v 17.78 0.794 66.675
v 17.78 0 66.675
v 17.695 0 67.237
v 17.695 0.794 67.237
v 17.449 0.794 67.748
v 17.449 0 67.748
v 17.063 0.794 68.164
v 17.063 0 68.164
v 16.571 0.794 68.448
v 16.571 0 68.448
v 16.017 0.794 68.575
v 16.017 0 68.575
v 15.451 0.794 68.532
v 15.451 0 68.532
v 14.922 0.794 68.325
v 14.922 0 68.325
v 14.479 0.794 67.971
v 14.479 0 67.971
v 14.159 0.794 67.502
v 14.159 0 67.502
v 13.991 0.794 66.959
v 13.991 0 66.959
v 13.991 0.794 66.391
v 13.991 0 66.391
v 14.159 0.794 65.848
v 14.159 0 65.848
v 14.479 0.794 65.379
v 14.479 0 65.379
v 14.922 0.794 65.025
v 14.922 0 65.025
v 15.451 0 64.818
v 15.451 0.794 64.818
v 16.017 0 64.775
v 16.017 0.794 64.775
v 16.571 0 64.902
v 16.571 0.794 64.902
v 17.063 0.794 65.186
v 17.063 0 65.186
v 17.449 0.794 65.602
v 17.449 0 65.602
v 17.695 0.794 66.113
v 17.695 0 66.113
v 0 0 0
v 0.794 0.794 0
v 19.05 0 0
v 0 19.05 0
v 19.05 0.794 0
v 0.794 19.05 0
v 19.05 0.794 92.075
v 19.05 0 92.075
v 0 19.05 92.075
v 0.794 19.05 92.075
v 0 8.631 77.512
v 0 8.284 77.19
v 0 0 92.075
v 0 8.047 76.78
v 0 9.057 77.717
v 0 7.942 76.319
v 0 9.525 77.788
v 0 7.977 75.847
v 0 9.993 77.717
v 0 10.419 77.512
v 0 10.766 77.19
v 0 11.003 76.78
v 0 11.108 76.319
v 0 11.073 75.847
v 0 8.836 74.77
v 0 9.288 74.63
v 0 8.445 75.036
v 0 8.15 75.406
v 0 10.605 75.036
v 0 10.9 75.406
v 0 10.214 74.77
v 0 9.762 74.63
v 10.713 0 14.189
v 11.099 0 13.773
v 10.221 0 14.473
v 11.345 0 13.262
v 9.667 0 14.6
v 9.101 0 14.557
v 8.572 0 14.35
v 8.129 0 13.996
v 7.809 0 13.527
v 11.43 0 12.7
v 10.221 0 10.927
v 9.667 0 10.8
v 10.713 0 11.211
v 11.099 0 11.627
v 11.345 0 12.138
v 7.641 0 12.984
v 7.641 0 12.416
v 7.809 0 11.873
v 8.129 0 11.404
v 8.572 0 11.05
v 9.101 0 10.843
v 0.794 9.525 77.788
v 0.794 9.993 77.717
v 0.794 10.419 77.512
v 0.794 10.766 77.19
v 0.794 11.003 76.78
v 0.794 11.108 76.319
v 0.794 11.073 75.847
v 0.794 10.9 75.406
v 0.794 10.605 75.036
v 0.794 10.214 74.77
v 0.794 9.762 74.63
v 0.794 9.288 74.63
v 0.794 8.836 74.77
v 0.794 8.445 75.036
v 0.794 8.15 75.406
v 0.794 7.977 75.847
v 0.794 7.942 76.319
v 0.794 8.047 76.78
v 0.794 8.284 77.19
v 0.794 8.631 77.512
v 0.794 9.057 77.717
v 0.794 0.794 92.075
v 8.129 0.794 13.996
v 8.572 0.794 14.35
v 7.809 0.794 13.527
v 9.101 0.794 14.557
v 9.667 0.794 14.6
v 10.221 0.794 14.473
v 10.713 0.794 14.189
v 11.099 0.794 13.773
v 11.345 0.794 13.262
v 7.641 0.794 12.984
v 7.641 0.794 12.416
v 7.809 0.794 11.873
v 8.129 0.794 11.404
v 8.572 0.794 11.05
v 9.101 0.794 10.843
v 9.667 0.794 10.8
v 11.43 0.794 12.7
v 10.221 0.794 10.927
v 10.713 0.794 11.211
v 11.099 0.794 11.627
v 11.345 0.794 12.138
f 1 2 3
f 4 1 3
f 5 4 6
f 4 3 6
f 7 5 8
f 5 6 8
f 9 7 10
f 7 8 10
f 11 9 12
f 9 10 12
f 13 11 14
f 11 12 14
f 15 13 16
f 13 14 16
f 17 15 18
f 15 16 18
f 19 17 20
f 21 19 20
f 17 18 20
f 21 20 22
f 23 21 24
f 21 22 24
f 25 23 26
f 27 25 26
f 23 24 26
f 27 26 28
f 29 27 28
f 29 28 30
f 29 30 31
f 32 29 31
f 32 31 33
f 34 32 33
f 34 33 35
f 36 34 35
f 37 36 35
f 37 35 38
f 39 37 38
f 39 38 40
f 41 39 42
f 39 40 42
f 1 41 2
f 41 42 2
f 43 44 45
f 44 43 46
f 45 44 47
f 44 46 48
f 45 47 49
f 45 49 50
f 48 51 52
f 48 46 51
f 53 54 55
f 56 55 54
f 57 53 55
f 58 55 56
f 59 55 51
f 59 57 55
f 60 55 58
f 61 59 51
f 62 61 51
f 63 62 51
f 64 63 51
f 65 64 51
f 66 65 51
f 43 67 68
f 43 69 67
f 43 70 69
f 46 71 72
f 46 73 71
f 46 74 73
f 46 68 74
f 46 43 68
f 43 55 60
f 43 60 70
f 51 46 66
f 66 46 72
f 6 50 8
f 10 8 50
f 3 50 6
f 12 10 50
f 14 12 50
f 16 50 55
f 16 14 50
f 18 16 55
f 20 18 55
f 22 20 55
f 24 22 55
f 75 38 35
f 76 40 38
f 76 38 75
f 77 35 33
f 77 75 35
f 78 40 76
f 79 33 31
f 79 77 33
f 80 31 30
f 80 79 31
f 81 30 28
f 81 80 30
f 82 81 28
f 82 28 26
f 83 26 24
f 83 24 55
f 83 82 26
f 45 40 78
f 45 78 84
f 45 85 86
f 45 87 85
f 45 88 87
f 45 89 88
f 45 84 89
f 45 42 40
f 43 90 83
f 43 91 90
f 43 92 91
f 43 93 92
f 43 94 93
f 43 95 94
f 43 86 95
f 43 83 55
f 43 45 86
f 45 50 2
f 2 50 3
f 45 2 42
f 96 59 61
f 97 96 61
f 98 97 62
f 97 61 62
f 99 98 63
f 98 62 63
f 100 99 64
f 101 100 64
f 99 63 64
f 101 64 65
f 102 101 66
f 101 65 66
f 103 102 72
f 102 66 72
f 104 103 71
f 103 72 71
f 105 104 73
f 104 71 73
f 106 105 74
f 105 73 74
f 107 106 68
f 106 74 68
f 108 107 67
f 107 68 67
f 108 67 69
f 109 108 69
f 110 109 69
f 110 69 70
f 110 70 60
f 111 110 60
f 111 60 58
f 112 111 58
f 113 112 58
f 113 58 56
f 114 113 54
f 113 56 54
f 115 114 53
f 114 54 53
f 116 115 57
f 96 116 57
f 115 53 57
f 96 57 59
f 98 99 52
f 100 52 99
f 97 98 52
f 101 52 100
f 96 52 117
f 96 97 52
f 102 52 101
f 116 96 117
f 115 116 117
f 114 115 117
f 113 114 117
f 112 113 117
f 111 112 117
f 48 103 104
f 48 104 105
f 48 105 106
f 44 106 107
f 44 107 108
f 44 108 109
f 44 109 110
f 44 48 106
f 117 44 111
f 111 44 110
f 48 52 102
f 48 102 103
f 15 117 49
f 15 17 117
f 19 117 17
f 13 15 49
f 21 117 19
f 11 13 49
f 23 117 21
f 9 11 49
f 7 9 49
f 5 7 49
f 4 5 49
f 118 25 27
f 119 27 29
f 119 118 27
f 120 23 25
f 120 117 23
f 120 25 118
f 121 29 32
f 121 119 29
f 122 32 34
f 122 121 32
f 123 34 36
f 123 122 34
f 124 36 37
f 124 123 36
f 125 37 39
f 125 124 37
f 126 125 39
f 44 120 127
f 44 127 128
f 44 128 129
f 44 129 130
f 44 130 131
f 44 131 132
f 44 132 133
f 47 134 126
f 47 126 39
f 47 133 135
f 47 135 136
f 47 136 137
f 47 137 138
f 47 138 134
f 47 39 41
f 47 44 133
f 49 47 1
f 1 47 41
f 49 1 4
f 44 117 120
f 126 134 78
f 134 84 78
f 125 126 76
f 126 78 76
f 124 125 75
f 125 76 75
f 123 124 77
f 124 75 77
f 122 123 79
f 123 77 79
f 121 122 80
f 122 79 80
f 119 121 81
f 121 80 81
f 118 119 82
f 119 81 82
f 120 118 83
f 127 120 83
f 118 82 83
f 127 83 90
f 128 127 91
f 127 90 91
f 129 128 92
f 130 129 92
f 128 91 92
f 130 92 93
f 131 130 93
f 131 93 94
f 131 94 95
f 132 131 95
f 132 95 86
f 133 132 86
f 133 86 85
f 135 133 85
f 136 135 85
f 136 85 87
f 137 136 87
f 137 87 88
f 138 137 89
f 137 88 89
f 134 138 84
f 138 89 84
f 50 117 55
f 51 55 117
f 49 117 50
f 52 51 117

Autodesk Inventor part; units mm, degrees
ref_plane "YZ Plane" through (0, 0, 0) normal (1, 0, 0) x (0, 1, 0)
ref_plane "XZ Plane" through (0, 0, 0) normal (0, 1, 0) x (-1, 0, 0)
ref_plane "XY Plane" through (0, 0, 0) normal (0, 0, 1) x (1, 0, 0)
sketch "Sketch1" plane through (0, 0, 0) normal (0, 0, 1) x (1, 0, 0)
  line L0 (0, 0) -> (0, 19.05)
  line L1 (0, 19.05) -> (0.7937, 19.05)
  line L2 (0.7937, 19.05) -> (0.7938, 0.7937)
  line L3 (0.7938, 0.7937) -> (19.05, 0.7937)
  line L4 (19.05, 0.7937) -> (19.05, 0)
  line L5 (19.05, 0) -> (0, 0)
  dimension "d0" = 19.05
  dimension "d1" = 0.7937
extrude "Extrusion1" add sketch "Sketch1" along normal blind 92.075
sketch "Sketch2" plane through (0, 0, 0) normal (0, -1, 0) x (1, 0, 0)
  line L0 (19.05, 0) -> (0, 0) projected
  line L1 (19.05, 0) -> (19.05, 92.075) projected
  line L2 (0, 92.075) -> (19.05, 92.075) projected
  line L3 (15.875, 92.075) -> (15.875, 0) construction
  circle A0 centre (15.875, 66.675) radius 1.905
  line L4 (9.525, 92.075) -> (9.525, 0) construction
  circle A1 centre (9.525, 12.7) radius 1.905
  dimension "d4" = 3.175
  dimension "d5" = 3.81
  dimension "d6" = 25.4
  dimension "d7" = 12.7
extrude "Extrusion2" cut sketch "Sketch2" against normal through all
sketch "Sketch3" plane through (0, 0, 0) normal (-1, 0, 0) x (0, 0, 1)
  line L0 (0, 0) -> (0, 19.05) projected
  line L1 (92.075, 19.05) -> (92.075, 0) projected
  line L2 (0, 9.525) -> (92.075, 9.525) construction
  circle A0 centre (76.2, 9.525) radius 1.5875
  dimension "d10" = 3.175
  dimension "d11" = 15.875
extrude "Extrusion3" cut sketch "Sketch3" against normal through all
properties part number "Hopper Bracing P1" material "Aluminum 6061"
